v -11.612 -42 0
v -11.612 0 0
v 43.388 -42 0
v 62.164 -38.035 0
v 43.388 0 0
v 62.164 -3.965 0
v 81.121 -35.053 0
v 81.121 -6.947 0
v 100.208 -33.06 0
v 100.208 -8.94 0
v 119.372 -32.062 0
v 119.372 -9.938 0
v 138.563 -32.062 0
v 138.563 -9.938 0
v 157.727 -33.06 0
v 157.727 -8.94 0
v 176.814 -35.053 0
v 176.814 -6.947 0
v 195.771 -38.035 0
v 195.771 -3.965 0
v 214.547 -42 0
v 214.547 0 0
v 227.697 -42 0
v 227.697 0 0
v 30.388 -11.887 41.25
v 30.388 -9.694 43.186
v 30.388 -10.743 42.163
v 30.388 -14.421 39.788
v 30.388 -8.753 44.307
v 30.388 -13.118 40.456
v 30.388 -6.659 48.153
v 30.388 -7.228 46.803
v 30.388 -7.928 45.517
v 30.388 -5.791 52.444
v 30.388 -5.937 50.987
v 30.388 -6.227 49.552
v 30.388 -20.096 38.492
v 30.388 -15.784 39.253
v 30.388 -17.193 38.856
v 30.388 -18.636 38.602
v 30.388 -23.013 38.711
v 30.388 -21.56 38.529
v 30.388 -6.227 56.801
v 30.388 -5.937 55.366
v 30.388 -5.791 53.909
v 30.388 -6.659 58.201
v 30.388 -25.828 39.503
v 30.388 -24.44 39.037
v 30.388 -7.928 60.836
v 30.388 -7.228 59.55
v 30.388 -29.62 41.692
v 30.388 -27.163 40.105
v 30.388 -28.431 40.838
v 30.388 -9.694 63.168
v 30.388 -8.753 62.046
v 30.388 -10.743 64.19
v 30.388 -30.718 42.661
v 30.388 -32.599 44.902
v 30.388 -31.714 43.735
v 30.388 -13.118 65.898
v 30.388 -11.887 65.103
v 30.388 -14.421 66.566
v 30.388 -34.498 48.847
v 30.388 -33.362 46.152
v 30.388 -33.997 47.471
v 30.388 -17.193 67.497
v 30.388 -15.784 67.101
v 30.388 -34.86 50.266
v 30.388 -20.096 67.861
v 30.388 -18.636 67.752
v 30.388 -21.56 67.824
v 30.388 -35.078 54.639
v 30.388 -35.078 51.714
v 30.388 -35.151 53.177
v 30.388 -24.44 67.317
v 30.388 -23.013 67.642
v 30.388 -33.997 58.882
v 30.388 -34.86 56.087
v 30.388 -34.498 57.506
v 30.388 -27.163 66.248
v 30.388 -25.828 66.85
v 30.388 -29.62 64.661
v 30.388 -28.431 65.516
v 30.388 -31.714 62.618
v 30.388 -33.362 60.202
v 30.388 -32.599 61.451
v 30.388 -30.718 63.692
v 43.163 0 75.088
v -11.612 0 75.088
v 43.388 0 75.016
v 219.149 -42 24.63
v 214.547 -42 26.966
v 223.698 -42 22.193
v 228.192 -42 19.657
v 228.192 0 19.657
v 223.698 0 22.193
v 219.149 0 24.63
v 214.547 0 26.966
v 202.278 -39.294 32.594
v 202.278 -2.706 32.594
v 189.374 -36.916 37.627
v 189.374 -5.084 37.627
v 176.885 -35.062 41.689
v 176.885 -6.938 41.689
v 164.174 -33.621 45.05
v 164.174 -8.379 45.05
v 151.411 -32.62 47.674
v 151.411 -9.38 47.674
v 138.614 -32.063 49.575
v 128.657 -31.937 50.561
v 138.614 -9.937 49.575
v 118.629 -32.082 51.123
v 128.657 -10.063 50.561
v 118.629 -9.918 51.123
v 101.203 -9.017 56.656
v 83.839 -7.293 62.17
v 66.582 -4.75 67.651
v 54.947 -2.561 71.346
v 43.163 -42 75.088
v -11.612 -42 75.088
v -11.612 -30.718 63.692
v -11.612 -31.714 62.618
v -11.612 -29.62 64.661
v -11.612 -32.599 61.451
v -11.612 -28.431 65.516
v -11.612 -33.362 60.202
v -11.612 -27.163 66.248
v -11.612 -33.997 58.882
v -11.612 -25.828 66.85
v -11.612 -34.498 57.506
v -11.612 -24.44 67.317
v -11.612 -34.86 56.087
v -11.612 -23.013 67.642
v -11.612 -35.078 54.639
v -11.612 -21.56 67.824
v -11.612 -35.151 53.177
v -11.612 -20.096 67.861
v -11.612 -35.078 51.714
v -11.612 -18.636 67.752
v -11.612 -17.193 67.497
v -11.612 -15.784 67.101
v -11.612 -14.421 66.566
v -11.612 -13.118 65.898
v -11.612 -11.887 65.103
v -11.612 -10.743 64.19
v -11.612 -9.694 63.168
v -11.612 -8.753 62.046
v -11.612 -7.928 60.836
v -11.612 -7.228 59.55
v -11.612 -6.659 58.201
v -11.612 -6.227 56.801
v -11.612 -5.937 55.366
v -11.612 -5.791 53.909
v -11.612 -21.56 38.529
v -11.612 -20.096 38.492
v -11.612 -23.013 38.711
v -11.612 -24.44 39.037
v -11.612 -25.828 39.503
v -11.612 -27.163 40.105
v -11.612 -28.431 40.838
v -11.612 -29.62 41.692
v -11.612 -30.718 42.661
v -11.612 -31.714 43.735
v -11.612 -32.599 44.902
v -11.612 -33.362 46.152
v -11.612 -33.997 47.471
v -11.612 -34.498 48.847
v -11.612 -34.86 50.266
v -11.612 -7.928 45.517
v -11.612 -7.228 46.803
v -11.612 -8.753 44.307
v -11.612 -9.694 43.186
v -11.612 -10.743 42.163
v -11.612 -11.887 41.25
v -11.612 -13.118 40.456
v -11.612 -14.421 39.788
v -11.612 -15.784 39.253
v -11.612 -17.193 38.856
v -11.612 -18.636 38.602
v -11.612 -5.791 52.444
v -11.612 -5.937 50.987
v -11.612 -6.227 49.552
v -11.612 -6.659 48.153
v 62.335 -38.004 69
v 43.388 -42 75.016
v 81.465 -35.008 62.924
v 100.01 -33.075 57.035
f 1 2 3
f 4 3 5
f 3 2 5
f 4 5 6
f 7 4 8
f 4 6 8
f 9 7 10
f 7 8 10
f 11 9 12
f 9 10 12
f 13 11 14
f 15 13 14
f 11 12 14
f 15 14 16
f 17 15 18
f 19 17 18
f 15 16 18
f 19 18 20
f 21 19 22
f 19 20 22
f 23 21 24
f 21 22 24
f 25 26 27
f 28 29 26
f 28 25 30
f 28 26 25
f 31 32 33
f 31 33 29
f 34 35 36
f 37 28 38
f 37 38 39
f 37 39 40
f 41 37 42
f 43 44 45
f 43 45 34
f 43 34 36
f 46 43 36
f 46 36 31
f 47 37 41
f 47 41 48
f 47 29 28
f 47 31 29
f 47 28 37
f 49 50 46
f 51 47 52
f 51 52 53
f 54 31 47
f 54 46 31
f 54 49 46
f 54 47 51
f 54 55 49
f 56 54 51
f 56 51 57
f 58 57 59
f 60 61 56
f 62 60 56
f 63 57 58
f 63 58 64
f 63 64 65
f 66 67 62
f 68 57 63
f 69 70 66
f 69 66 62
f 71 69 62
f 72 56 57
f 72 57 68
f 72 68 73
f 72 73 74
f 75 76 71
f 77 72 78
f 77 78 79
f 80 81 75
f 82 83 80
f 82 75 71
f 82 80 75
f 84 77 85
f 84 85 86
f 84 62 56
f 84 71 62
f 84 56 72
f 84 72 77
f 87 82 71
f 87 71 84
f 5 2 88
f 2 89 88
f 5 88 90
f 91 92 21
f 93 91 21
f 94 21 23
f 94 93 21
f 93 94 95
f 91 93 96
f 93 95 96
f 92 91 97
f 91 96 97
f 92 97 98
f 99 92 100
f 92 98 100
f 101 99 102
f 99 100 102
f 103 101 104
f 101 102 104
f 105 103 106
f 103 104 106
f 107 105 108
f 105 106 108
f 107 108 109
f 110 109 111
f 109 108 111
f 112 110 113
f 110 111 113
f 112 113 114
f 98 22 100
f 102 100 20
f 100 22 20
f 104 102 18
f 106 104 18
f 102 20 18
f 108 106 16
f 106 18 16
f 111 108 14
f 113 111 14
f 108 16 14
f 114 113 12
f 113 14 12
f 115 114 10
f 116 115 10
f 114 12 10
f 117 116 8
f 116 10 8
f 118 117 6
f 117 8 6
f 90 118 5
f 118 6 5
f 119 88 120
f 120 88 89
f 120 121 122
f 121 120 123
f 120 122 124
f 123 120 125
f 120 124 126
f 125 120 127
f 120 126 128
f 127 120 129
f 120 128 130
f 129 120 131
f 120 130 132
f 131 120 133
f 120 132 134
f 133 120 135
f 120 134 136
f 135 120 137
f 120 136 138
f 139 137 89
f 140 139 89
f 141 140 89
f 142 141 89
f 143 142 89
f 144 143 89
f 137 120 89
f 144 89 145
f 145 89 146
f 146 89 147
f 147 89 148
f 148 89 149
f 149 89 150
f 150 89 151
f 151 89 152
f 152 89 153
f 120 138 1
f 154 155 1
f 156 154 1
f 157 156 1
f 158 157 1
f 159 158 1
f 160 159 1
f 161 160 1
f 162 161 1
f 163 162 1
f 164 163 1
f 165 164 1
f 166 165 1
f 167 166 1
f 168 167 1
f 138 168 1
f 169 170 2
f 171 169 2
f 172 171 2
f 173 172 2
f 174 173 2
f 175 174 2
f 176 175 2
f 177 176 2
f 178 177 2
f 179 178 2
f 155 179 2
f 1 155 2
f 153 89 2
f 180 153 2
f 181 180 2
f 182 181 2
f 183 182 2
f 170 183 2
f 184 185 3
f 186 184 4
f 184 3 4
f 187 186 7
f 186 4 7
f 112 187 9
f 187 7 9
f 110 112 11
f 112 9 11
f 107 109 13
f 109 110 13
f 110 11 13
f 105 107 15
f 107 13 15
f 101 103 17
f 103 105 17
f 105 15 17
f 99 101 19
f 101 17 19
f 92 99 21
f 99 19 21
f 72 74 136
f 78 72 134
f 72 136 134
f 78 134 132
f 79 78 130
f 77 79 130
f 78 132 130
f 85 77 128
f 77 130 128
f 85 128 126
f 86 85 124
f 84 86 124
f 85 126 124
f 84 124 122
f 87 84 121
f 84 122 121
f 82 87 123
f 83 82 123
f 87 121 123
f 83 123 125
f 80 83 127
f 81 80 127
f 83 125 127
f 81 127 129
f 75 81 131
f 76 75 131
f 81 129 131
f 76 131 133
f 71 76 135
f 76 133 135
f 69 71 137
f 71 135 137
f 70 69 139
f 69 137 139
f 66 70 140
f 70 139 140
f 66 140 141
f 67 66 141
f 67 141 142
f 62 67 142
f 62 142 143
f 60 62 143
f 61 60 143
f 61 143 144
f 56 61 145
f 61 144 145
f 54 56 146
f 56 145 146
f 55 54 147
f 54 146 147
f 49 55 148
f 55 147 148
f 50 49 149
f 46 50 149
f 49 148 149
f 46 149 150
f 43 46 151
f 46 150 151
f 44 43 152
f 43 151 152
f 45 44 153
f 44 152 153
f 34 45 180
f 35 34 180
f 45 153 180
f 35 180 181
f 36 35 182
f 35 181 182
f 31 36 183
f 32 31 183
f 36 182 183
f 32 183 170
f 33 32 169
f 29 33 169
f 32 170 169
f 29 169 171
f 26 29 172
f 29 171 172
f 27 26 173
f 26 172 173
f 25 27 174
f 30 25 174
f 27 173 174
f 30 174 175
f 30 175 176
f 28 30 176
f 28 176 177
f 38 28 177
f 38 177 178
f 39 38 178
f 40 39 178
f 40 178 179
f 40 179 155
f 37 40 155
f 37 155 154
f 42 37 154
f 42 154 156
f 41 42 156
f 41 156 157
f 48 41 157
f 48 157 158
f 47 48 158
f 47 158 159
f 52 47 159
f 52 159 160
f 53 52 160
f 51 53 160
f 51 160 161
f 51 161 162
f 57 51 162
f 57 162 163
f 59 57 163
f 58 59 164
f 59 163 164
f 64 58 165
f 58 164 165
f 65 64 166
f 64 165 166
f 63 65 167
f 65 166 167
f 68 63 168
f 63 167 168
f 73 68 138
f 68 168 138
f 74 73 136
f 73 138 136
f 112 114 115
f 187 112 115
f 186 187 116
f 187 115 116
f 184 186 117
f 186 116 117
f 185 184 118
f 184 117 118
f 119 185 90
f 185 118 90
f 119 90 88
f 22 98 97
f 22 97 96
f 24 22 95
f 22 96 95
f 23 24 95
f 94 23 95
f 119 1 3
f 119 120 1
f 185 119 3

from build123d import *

# Parameters (mm, degrees)
F4_DEPTH = 42
F6_DEPTH = 127
F7_DEPTH = 127
F8_R     = 14.6889125436
F9_DEPTH = 42


# Not quite as in the source:
# - a feature of the source that left no trace in its solid (it failed there, or was rolled back) is left out


with BuildPart() as f4:
    # F2 (on Front) → F4 (new body)
    with BuildSketch(Plane.XZ):
        with BuildLine():
            Line((227.6969850063, 0), (228.1920313835, 19.6573249996))
            ThreePointArc((228.1920313835, 19.6573249996), (175.3476715099, 42.1359663093), (118.6285698173, 51.1225779498))
            Line((118.6285698173, 51.1225779498), (43.1631058455, 75.087800622))
            Line((43.1631058455, 75.087800622), (-11.6123249754, 75.087800622))
            Line((-11.6123249754, 75.087800622), (-11.6123249754, 0))
            Line((-11.6123249754, 0), (227.6969850063, 0))
        make_face()
    extrude(amount=F4_DEPTH)

    # F5 (on face) → F6 (cut)
    with BuildSketch(Plane(origin=(0, 0, 0), x_dir=(1, 0, 0), z_dir=(0, 0, -1))):
        with BuildLine():
            ThreePointArc((214.5471125841, 0), (128.9673938043, 10.0631527668), (43.3876750246, 0))
            Line((43.3876750246, 0), (214.5471125841, 0))
        make_face()
    extrude(amount=-F6_DEPTH, mode=Mode.SUBTRACT)

    # F5 (on face) → F7 (cut)
    with BuildSketch(Plane(origin=(0, 0, 0), x_dir=(1, 0, 0), z_dir=(0, 0, -1))):
        with BuildLine():
            Line((214.5471125841, 42), (43.3876750246, 42))
            ThreePointArc((43.3876750246, 42), (128.9673938043, 31.9368472332), (214.5471125841, 42))
        make_face()
    extrude(amount=-F7_DEPTH, mode=Mode.SUBTRACT)

    # F8 (on face) → F9 (cut)
    with BuildSketch(Plane(origin=(-11.6123249754, 0, 0), x_dir=(0, -1, 0), z_dir=(-1, 0, 0))):
        with Locations((20.4619783908, 53.1766302884)):
            Circle(F8_R)
    extrude(amount=-F9_DEPTH, mode=Mode.SUBTRACT)


solid = f4.part
